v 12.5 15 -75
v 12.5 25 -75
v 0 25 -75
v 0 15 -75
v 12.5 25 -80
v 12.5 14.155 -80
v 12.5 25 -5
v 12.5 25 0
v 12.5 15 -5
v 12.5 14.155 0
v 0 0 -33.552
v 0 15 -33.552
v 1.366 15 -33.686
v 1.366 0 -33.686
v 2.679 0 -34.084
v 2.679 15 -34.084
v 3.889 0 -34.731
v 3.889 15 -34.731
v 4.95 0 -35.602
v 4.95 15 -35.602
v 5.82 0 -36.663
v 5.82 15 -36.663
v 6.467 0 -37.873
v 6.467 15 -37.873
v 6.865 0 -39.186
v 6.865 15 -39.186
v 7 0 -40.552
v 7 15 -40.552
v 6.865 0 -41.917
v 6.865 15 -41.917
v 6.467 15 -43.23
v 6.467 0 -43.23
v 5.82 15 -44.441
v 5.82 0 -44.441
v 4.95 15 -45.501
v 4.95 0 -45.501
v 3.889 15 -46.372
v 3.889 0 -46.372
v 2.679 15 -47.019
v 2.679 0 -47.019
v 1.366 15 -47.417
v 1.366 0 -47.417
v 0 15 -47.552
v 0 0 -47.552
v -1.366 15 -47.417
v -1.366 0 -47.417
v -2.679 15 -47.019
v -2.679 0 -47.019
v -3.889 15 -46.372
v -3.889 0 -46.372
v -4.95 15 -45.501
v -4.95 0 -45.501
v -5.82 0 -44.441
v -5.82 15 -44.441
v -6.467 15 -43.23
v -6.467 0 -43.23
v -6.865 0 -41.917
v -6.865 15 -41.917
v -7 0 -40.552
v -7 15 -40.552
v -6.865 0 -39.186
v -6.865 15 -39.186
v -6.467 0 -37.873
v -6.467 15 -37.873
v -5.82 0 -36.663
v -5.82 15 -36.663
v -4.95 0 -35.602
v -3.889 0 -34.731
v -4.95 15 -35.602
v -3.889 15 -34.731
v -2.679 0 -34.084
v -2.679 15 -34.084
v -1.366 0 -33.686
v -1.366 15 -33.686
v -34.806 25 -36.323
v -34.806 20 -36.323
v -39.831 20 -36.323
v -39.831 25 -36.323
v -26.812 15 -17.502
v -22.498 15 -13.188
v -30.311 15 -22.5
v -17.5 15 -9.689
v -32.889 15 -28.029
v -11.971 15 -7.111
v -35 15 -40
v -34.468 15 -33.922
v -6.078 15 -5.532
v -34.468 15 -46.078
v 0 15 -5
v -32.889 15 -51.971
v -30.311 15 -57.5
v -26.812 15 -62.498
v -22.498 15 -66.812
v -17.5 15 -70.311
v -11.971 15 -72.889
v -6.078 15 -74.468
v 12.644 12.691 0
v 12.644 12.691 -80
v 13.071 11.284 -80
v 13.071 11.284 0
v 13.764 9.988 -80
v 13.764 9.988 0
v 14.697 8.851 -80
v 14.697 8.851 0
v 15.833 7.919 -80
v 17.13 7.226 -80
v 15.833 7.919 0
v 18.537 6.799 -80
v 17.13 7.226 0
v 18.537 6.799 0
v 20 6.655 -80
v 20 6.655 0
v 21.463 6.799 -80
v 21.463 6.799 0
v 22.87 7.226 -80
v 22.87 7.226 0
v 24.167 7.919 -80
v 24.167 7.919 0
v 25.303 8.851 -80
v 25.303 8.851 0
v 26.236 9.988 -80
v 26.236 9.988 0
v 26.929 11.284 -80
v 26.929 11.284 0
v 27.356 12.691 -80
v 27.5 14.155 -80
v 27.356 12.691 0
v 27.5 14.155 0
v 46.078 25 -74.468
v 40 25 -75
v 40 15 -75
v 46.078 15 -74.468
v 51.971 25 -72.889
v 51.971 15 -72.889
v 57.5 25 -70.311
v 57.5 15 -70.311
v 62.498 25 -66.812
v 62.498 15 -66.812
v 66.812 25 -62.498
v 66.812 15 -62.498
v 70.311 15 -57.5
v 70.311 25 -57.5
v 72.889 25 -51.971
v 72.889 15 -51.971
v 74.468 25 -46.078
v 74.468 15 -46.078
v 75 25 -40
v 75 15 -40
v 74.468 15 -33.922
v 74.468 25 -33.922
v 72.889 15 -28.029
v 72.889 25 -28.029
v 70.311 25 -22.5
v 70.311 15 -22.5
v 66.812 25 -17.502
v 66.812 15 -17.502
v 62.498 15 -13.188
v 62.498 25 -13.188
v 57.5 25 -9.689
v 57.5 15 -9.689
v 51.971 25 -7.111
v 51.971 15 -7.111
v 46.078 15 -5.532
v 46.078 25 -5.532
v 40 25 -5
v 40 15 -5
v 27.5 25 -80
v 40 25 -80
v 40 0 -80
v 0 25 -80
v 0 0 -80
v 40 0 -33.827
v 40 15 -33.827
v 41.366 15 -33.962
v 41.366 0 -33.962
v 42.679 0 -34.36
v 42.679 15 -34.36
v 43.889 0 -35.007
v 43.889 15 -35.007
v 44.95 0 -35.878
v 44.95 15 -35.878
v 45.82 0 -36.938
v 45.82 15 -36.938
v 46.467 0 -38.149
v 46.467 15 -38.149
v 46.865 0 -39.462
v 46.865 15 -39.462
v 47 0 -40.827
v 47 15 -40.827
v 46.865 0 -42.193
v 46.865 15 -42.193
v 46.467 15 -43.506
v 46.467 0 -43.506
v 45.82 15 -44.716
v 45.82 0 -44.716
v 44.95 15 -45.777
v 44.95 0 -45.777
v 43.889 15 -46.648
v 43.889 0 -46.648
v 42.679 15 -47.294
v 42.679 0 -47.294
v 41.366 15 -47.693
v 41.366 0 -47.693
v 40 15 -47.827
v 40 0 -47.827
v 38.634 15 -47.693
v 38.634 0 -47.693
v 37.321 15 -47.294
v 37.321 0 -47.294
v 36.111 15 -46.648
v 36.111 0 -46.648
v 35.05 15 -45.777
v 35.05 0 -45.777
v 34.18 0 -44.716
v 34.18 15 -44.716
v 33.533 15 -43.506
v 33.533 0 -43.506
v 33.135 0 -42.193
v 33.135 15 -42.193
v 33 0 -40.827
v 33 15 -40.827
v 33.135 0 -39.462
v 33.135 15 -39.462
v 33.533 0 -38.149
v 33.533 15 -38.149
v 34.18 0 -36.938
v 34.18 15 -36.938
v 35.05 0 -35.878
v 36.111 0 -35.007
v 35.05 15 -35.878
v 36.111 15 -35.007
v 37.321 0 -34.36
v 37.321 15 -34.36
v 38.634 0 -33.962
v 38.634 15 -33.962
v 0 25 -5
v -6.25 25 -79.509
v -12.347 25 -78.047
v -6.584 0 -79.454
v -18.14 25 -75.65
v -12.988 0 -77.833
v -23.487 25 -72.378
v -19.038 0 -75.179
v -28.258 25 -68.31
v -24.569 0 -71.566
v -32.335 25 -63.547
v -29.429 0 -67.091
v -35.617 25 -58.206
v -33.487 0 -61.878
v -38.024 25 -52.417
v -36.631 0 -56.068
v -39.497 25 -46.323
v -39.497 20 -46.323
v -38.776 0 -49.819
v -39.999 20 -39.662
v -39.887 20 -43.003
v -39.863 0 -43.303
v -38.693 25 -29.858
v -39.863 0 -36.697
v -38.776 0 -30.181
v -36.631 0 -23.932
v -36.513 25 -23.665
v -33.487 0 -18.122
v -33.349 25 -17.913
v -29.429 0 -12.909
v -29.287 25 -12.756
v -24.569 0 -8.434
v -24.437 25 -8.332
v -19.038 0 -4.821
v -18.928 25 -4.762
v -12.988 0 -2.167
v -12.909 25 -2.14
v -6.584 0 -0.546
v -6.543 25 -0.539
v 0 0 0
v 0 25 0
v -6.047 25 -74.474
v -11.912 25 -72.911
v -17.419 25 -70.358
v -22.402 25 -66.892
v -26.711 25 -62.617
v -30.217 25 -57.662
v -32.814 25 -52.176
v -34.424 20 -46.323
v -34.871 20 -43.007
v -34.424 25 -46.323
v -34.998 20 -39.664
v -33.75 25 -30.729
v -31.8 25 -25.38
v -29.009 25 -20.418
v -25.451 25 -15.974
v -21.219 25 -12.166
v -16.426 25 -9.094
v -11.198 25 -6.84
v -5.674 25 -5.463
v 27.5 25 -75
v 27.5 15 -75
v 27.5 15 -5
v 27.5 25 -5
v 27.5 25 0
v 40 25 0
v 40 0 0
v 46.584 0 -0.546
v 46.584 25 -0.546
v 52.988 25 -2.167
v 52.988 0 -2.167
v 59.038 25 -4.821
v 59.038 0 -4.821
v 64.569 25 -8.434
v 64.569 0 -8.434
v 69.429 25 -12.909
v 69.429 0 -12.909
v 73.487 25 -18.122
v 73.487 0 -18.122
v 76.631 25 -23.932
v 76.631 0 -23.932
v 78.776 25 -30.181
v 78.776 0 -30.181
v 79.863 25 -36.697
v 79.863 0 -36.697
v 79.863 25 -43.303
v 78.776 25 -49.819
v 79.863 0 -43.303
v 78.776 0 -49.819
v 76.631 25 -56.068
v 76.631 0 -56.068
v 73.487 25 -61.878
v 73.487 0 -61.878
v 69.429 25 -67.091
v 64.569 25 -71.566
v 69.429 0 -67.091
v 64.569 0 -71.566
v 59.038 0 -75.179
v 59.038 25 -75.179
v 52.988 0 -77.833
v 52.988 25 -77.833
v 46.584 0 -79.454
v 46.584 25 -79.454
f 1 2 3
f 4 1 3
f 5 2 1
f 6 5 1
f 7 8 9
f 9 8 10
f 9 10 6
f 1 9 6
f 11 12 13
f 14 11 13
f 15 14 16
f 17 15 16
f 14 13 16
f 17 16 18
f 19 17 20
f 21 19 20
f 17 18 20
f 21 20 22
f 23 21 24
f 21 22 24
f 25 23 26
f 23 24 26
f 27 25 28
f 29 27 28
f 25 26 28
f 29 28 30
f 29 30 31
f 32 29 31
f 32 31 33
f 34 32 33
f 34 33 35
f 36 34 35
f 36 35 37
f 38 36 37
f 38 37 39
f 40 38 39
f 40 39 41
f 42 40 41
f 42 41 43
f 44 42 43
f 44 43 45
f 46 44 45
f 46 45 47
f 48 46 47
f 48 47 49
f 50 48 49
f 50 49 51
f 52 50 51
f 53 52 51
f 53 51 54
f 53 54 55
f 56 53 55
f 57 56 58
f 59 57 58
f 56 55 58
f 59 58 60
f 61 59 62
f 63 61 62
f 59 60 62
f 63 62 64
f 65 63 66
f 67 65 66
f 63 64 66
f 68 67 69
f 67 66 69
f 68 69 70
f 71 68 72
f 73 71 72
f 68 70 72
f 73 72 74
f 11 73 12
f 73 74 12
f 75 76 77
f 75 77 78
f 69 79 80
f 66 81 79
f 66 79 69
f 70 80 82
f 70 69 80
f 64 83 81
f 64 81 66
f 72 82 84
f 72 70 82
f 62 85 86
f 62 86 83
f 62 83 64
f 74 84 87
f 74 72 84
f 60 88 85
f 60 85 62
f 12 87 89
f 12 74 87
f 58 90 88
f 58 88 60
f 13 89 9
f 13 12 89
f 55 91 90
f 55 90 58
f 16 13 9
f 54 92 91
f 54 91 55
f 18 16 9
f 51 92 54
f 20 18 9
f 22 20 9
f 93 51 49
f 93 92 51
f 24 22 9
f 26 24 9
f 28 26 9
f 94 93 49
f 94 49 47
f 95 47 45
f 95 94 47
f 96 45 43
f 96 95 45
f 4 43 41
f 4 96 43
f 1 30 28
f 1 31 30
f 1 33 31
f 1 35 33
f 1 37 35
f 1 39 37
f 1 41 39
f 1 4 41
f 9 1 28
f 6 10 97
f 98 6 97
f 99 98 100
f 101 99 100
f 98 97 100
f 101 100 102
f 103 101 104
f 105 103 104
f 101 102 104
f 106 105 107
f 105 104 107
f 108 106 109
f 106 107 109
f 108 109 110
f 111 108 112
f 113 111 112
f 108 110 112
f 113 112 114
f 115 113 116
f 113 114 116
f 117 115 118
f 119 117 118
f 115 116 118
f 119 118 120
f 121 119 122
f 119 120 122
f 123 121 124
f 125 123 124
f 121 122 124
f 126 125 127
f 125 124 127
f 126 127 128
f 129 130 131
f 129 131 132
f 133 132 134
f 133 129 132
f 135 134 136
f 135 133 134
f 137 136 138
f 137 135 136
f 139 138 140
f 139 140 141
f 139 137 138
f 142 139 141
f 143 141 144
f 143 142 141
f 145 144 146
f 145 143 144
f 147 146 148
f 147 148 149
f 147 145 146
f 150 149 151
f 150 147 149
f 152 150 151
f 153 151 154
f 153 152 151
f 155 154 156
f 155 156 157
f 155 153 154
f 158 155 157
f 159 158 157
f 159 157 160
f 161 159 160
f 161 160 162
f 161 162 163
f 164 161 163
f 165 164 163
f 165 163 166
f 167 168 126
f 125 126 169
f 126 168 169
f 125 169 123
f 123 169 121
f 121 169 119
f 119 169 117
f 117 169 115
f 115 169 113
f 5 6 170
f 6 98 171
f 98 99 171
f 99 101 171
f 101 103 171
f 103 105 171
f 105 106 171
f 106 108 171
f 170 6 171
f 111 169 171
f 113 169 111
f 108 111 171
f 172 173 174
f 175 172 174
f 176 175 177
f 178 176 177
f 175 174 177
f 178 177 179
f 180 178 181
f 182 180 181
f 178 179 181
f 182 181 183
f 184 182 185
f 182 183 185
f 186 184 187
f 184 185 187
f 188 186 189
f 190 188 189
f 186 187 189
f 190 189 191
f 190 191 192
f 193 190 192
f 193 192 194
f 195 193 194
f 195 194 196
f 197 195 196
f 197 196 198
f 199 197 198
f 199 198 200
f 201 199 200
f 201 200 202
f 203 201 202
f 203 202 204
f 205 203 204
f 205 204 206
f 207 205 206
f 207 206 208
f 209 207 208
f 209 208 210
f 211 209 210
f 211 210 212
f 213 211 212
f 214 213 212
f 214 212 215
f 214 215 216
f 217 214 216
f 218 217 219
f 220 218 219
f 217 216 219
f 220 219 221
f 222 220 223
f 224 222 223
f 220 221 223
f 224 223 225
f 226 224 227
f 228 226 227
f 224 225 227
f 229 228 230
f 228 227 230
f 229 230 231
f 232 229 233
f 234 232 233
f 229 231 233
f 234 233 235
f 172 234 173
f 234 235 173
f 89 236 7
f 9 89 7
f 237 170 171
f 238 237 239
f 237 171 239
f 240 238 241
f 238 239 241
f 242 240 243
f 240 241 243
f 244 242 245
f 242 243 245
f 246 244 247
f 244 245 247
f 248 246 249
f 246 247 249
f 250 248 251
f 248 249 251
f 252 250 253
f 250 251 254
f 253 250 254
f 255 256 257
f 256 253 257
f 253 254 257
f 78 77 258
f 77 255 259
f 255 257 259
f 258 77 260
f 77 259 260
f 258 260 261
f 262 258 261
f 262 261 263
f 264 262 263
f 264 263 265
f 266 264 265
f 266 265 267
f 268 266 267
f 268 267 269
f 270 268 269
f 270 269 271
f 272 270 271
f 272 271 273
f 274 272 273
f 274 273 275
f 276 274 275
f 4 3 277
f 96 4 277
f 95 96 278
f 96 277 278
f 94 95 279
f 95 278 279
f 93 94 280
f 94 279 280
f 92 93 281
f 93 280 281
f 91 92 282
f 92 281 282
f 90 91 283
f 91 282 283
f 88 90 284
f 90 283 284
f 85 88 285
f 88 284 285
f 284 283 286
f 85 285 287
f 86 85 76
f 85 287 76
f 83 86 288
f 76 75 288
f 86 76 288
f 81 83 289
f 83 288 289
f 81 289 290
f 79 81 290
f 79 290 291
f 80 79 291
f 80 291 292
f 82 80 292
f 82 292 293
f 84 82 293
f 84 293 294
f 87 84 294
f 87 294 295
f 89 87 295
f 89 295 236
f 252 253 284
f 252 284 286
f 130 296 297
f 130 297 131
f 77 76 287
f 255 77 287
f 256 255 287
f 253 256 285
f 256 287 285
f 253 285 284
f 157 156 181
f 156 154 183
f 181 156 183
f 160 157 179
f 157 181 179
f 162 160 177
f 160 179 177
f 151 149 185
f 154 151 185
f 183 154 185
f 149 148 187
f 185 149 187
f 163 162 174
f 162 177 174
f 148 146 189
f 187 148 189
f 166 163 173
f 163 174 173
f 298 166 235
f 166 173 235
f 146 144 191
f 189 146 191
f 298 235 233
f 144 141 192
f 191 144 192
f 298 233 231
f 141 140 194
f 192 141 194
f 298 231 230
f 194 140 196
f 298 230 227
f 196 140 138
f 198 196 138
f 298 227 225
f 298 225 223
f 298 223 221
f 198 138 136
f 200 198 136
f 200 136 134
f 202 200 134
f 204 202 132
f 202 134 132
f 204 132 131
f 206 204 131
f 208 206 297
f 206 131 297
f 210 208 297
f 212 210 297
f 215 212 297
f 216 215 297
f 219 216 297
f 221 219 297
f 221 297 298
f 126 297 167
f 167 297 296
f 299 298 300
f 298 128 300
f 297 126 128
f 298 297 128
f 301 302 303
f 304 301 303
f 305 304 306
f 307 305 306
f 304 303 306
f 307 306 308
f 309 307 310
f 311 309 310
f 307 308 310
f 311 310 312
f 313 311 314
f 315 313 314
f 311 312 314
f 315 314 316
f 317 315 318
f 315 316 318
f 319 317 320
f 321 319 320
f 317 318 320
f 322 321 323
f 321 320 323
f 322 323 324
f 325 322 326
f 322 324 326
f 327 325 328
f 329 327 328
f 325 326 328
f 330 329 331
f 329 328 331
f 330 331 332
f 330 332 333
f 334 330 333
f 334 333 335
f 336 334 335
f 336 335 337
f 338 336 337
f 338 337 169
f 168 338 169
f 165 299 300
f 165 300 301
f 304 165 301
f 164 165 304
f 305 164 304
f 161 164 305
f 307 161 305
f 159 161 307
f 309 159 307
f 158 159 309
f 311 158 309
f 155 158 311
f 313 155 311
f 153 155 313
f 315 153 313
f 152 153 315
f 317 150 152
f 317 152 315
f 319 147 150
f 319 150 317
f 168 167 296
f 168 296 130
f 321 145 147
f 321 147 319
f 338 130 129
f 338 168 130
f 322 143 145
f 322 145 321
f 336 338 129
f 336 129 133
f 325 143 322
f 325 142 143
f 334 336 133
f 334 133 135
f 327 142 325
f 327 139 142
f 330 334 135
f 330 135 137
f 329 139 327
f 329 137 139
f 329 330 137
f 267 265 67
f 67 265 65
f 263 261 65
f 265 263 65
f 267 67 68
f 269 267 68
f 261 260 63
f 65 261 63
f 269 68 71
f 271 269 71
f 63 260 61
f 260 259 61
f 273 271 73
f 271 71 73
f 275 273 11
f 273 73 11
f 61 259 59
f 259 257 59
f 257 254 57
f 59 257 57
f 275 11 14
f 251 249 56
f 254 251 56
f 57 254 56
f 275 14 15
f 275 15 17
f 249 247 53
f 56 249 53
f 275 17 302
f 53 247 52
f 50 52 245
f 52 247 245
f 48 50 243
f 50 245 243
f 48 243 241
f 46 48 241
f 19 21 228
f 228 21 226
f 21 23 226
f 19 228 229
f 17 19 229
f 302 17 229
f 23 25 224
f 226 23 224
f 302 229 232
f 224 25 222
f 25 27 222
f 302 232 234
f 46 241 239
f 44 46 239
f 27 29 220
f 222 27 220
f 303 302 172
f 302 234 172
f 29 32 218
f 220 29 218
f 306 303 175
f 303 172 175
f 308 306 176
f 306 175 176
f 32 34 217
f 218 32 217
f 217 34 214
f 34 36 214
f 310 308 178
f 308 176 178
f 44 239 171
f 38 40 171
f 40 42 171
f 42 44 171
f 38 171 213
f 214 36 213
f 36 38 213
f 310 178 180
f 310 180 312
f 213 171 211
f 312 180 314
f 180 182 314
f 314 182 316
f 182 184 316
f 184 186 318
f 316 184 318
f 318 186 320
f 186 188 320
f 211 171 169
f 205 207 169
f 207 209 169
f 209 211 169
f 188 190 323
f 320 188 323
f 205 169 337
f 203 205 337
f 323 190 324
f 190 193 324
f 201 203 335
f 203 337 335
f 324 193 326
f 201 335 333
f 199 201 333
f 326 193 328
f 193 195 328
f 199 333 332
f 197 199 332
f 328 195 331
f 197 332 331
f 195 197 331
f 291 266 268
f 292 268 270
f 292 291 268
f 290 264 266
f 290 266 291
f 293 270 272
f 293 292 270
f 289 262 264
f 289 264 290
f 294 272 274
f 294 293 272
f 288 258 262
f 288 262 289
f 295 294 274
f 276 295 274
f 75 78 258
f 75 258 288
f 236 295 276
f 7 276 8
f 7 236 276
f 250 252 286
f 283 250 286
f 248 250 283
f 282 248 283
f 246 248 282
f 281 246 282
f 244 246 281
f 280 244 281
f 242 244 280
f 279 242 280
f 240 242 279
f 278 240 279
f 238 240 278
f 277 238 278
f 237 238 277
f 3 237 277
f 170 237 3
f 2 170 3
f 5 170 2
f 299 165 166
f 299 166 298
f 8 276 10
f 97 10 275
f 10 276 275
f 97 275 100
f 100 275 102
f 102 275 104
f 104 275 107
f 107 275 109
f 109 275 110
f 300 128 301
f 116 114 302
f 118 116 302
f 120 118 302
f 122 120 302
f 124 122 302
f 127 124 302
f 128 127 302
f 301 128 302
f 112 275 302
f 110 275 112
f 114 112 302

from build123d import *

# Parameters (mm, degrees)
RESSALTO_EXTRUS_O1_DEPTH = 25
CORTE_EXTRUS_O1_DEPTH    = 116.866302263
CORTE_EXTRUS_O2_DEPTH    = 10
CORTE_EXTRUS_O3_DEPTH    = 10
ESBO_O8_W                = 10
ESBO_O8_H                = 5
CORTE_EXTRUS_O4_DEPTH    = 108.61621625
ESBO_O10_R               = 7
CORTE_EXTRUS_O5_DEPTH    = 115.127122105
ESBO_O11_R               = 7
CORTE_EXTRUS_O6_DEPTH    = 115.127122105


with BuildPart() as part:
    # Esboço1 → Ressalto-extrusão1 (new body)
    with BuildSketch(Plane(origin=(0, 0, 0), x_dir=(1, 0, 0), z_dir=(0, 1, 0))):
        with BuildLine():
            Line((0, 0), (40, 0))
            ThreePointArc((40, 0), (80, 40), (40, 80))
            Line((40, 80), (0, 80))
            ThreePointArc((0, 80), (-40, 40), (0, 0))
        make_face()
    extrude(amount=RESSALTO_EXTRUS_O1_DEPTH)

    # Esboço5 → Corte-extrusão1 (cut, through all)
    with BuildSketch(Plane.XY):
        with BuildLine():
            Line((12.5, 25), (12.5, 14.154597668))
            ThreePointArc((12.5, 14.154597668), (20, 6.654597668), (27.5, 14.154597668))
            Line((27.5, 14.154597668), (27.5, 25))
            Line((27.5, 25), (12.5, 25))
        make_face()
    extrude(amount=-CORTE_EXTRUS_O1_DEPTH, mode=Mode.SUBTRACT)

    # Esboço6 → Corte-extrusão2 (cut)
    with BuildSketch(Plane(origin=(0, 25, 0), x_dir=(1, 0, 0), z_dir=(0, 1, 0))):
        with BuildLine():
            Line((12.5, 75), (0, 75))
            ThreePointArc((0, 75), (-35, 40), (0, 5))
            Line((0, 5), (12.5, 5))
            Line((12.5, 5), (12.5, 75))
        make_face()
    extrude(amount=-CORTE_EXTRUS_O2_DEPTH, mode=Mode.SUBTRACT)

    # Esboço7 → Corte-extrusão3 (cut)
    with BuildSketch(Plane(origin=(0, 25, 0), x_dir=(1, 0, 0), z_dir=(0, 1, 0))):
        with BuildLine():
            Line((27.5, 75), (40, 75))
            ThreePointArc((40, 75), (75, 40), (40, 5))
            Line((40, 5), (27.5, 5))
            Line((27.5, 5), (27.5, 75))
        make_face()
    extrude(amount=-CORTE_EXTRUS_O3_DEPTH, mode=Mode.SUBTRACT)

    # Esboço8 → Corte-extrusão4 (cut, through all)
    with BuildSketch(Plane(origin=(12.5, 0, 0), x_dir=(0, 0, -1), z_dir=(1, 0, 0))):
        with Locations((41.323116294, 22.5)):
            Rectangle(ESBO_O8_W, ESBO_O8_H)
    extrude(amount=-CORTE_EXTRUS_O4_DEPTH, mode=Mode.SUBTRACT)

    # Esboço10 → Corte-extrusão5 (cut, through all)
    with BuildSketch(Plane(origin=(0, 15, 0), x_dir=(1, 0, 0), z_dir=(0, 1, 0))):
        with Locations(Location((0, 40.551532556, 0), (0, 0, 270))):
            Circle(ESBO_O10_R)
    extrude(amount=-CORTE_EXTRUS_O5_DEPTH, mode=Mode.SUBTRACT)

    # Esboço11 → Corte-extrusão6 (cut, through all)
    with BuildSketch(Plane(origin=(0, 15, 0), x_dir=(1, 0, 0), z_dir=(0, 1, 0))):
        with Locations(Location((40, 40.827298834, 0), (0, 0, 270))):
            Circle(ESBO_O11_R)
    extrude(amount=-CORTE_EXTRUS_O6_DEPTH, mode=Mode.SUBTRACT)


solid = part.part
